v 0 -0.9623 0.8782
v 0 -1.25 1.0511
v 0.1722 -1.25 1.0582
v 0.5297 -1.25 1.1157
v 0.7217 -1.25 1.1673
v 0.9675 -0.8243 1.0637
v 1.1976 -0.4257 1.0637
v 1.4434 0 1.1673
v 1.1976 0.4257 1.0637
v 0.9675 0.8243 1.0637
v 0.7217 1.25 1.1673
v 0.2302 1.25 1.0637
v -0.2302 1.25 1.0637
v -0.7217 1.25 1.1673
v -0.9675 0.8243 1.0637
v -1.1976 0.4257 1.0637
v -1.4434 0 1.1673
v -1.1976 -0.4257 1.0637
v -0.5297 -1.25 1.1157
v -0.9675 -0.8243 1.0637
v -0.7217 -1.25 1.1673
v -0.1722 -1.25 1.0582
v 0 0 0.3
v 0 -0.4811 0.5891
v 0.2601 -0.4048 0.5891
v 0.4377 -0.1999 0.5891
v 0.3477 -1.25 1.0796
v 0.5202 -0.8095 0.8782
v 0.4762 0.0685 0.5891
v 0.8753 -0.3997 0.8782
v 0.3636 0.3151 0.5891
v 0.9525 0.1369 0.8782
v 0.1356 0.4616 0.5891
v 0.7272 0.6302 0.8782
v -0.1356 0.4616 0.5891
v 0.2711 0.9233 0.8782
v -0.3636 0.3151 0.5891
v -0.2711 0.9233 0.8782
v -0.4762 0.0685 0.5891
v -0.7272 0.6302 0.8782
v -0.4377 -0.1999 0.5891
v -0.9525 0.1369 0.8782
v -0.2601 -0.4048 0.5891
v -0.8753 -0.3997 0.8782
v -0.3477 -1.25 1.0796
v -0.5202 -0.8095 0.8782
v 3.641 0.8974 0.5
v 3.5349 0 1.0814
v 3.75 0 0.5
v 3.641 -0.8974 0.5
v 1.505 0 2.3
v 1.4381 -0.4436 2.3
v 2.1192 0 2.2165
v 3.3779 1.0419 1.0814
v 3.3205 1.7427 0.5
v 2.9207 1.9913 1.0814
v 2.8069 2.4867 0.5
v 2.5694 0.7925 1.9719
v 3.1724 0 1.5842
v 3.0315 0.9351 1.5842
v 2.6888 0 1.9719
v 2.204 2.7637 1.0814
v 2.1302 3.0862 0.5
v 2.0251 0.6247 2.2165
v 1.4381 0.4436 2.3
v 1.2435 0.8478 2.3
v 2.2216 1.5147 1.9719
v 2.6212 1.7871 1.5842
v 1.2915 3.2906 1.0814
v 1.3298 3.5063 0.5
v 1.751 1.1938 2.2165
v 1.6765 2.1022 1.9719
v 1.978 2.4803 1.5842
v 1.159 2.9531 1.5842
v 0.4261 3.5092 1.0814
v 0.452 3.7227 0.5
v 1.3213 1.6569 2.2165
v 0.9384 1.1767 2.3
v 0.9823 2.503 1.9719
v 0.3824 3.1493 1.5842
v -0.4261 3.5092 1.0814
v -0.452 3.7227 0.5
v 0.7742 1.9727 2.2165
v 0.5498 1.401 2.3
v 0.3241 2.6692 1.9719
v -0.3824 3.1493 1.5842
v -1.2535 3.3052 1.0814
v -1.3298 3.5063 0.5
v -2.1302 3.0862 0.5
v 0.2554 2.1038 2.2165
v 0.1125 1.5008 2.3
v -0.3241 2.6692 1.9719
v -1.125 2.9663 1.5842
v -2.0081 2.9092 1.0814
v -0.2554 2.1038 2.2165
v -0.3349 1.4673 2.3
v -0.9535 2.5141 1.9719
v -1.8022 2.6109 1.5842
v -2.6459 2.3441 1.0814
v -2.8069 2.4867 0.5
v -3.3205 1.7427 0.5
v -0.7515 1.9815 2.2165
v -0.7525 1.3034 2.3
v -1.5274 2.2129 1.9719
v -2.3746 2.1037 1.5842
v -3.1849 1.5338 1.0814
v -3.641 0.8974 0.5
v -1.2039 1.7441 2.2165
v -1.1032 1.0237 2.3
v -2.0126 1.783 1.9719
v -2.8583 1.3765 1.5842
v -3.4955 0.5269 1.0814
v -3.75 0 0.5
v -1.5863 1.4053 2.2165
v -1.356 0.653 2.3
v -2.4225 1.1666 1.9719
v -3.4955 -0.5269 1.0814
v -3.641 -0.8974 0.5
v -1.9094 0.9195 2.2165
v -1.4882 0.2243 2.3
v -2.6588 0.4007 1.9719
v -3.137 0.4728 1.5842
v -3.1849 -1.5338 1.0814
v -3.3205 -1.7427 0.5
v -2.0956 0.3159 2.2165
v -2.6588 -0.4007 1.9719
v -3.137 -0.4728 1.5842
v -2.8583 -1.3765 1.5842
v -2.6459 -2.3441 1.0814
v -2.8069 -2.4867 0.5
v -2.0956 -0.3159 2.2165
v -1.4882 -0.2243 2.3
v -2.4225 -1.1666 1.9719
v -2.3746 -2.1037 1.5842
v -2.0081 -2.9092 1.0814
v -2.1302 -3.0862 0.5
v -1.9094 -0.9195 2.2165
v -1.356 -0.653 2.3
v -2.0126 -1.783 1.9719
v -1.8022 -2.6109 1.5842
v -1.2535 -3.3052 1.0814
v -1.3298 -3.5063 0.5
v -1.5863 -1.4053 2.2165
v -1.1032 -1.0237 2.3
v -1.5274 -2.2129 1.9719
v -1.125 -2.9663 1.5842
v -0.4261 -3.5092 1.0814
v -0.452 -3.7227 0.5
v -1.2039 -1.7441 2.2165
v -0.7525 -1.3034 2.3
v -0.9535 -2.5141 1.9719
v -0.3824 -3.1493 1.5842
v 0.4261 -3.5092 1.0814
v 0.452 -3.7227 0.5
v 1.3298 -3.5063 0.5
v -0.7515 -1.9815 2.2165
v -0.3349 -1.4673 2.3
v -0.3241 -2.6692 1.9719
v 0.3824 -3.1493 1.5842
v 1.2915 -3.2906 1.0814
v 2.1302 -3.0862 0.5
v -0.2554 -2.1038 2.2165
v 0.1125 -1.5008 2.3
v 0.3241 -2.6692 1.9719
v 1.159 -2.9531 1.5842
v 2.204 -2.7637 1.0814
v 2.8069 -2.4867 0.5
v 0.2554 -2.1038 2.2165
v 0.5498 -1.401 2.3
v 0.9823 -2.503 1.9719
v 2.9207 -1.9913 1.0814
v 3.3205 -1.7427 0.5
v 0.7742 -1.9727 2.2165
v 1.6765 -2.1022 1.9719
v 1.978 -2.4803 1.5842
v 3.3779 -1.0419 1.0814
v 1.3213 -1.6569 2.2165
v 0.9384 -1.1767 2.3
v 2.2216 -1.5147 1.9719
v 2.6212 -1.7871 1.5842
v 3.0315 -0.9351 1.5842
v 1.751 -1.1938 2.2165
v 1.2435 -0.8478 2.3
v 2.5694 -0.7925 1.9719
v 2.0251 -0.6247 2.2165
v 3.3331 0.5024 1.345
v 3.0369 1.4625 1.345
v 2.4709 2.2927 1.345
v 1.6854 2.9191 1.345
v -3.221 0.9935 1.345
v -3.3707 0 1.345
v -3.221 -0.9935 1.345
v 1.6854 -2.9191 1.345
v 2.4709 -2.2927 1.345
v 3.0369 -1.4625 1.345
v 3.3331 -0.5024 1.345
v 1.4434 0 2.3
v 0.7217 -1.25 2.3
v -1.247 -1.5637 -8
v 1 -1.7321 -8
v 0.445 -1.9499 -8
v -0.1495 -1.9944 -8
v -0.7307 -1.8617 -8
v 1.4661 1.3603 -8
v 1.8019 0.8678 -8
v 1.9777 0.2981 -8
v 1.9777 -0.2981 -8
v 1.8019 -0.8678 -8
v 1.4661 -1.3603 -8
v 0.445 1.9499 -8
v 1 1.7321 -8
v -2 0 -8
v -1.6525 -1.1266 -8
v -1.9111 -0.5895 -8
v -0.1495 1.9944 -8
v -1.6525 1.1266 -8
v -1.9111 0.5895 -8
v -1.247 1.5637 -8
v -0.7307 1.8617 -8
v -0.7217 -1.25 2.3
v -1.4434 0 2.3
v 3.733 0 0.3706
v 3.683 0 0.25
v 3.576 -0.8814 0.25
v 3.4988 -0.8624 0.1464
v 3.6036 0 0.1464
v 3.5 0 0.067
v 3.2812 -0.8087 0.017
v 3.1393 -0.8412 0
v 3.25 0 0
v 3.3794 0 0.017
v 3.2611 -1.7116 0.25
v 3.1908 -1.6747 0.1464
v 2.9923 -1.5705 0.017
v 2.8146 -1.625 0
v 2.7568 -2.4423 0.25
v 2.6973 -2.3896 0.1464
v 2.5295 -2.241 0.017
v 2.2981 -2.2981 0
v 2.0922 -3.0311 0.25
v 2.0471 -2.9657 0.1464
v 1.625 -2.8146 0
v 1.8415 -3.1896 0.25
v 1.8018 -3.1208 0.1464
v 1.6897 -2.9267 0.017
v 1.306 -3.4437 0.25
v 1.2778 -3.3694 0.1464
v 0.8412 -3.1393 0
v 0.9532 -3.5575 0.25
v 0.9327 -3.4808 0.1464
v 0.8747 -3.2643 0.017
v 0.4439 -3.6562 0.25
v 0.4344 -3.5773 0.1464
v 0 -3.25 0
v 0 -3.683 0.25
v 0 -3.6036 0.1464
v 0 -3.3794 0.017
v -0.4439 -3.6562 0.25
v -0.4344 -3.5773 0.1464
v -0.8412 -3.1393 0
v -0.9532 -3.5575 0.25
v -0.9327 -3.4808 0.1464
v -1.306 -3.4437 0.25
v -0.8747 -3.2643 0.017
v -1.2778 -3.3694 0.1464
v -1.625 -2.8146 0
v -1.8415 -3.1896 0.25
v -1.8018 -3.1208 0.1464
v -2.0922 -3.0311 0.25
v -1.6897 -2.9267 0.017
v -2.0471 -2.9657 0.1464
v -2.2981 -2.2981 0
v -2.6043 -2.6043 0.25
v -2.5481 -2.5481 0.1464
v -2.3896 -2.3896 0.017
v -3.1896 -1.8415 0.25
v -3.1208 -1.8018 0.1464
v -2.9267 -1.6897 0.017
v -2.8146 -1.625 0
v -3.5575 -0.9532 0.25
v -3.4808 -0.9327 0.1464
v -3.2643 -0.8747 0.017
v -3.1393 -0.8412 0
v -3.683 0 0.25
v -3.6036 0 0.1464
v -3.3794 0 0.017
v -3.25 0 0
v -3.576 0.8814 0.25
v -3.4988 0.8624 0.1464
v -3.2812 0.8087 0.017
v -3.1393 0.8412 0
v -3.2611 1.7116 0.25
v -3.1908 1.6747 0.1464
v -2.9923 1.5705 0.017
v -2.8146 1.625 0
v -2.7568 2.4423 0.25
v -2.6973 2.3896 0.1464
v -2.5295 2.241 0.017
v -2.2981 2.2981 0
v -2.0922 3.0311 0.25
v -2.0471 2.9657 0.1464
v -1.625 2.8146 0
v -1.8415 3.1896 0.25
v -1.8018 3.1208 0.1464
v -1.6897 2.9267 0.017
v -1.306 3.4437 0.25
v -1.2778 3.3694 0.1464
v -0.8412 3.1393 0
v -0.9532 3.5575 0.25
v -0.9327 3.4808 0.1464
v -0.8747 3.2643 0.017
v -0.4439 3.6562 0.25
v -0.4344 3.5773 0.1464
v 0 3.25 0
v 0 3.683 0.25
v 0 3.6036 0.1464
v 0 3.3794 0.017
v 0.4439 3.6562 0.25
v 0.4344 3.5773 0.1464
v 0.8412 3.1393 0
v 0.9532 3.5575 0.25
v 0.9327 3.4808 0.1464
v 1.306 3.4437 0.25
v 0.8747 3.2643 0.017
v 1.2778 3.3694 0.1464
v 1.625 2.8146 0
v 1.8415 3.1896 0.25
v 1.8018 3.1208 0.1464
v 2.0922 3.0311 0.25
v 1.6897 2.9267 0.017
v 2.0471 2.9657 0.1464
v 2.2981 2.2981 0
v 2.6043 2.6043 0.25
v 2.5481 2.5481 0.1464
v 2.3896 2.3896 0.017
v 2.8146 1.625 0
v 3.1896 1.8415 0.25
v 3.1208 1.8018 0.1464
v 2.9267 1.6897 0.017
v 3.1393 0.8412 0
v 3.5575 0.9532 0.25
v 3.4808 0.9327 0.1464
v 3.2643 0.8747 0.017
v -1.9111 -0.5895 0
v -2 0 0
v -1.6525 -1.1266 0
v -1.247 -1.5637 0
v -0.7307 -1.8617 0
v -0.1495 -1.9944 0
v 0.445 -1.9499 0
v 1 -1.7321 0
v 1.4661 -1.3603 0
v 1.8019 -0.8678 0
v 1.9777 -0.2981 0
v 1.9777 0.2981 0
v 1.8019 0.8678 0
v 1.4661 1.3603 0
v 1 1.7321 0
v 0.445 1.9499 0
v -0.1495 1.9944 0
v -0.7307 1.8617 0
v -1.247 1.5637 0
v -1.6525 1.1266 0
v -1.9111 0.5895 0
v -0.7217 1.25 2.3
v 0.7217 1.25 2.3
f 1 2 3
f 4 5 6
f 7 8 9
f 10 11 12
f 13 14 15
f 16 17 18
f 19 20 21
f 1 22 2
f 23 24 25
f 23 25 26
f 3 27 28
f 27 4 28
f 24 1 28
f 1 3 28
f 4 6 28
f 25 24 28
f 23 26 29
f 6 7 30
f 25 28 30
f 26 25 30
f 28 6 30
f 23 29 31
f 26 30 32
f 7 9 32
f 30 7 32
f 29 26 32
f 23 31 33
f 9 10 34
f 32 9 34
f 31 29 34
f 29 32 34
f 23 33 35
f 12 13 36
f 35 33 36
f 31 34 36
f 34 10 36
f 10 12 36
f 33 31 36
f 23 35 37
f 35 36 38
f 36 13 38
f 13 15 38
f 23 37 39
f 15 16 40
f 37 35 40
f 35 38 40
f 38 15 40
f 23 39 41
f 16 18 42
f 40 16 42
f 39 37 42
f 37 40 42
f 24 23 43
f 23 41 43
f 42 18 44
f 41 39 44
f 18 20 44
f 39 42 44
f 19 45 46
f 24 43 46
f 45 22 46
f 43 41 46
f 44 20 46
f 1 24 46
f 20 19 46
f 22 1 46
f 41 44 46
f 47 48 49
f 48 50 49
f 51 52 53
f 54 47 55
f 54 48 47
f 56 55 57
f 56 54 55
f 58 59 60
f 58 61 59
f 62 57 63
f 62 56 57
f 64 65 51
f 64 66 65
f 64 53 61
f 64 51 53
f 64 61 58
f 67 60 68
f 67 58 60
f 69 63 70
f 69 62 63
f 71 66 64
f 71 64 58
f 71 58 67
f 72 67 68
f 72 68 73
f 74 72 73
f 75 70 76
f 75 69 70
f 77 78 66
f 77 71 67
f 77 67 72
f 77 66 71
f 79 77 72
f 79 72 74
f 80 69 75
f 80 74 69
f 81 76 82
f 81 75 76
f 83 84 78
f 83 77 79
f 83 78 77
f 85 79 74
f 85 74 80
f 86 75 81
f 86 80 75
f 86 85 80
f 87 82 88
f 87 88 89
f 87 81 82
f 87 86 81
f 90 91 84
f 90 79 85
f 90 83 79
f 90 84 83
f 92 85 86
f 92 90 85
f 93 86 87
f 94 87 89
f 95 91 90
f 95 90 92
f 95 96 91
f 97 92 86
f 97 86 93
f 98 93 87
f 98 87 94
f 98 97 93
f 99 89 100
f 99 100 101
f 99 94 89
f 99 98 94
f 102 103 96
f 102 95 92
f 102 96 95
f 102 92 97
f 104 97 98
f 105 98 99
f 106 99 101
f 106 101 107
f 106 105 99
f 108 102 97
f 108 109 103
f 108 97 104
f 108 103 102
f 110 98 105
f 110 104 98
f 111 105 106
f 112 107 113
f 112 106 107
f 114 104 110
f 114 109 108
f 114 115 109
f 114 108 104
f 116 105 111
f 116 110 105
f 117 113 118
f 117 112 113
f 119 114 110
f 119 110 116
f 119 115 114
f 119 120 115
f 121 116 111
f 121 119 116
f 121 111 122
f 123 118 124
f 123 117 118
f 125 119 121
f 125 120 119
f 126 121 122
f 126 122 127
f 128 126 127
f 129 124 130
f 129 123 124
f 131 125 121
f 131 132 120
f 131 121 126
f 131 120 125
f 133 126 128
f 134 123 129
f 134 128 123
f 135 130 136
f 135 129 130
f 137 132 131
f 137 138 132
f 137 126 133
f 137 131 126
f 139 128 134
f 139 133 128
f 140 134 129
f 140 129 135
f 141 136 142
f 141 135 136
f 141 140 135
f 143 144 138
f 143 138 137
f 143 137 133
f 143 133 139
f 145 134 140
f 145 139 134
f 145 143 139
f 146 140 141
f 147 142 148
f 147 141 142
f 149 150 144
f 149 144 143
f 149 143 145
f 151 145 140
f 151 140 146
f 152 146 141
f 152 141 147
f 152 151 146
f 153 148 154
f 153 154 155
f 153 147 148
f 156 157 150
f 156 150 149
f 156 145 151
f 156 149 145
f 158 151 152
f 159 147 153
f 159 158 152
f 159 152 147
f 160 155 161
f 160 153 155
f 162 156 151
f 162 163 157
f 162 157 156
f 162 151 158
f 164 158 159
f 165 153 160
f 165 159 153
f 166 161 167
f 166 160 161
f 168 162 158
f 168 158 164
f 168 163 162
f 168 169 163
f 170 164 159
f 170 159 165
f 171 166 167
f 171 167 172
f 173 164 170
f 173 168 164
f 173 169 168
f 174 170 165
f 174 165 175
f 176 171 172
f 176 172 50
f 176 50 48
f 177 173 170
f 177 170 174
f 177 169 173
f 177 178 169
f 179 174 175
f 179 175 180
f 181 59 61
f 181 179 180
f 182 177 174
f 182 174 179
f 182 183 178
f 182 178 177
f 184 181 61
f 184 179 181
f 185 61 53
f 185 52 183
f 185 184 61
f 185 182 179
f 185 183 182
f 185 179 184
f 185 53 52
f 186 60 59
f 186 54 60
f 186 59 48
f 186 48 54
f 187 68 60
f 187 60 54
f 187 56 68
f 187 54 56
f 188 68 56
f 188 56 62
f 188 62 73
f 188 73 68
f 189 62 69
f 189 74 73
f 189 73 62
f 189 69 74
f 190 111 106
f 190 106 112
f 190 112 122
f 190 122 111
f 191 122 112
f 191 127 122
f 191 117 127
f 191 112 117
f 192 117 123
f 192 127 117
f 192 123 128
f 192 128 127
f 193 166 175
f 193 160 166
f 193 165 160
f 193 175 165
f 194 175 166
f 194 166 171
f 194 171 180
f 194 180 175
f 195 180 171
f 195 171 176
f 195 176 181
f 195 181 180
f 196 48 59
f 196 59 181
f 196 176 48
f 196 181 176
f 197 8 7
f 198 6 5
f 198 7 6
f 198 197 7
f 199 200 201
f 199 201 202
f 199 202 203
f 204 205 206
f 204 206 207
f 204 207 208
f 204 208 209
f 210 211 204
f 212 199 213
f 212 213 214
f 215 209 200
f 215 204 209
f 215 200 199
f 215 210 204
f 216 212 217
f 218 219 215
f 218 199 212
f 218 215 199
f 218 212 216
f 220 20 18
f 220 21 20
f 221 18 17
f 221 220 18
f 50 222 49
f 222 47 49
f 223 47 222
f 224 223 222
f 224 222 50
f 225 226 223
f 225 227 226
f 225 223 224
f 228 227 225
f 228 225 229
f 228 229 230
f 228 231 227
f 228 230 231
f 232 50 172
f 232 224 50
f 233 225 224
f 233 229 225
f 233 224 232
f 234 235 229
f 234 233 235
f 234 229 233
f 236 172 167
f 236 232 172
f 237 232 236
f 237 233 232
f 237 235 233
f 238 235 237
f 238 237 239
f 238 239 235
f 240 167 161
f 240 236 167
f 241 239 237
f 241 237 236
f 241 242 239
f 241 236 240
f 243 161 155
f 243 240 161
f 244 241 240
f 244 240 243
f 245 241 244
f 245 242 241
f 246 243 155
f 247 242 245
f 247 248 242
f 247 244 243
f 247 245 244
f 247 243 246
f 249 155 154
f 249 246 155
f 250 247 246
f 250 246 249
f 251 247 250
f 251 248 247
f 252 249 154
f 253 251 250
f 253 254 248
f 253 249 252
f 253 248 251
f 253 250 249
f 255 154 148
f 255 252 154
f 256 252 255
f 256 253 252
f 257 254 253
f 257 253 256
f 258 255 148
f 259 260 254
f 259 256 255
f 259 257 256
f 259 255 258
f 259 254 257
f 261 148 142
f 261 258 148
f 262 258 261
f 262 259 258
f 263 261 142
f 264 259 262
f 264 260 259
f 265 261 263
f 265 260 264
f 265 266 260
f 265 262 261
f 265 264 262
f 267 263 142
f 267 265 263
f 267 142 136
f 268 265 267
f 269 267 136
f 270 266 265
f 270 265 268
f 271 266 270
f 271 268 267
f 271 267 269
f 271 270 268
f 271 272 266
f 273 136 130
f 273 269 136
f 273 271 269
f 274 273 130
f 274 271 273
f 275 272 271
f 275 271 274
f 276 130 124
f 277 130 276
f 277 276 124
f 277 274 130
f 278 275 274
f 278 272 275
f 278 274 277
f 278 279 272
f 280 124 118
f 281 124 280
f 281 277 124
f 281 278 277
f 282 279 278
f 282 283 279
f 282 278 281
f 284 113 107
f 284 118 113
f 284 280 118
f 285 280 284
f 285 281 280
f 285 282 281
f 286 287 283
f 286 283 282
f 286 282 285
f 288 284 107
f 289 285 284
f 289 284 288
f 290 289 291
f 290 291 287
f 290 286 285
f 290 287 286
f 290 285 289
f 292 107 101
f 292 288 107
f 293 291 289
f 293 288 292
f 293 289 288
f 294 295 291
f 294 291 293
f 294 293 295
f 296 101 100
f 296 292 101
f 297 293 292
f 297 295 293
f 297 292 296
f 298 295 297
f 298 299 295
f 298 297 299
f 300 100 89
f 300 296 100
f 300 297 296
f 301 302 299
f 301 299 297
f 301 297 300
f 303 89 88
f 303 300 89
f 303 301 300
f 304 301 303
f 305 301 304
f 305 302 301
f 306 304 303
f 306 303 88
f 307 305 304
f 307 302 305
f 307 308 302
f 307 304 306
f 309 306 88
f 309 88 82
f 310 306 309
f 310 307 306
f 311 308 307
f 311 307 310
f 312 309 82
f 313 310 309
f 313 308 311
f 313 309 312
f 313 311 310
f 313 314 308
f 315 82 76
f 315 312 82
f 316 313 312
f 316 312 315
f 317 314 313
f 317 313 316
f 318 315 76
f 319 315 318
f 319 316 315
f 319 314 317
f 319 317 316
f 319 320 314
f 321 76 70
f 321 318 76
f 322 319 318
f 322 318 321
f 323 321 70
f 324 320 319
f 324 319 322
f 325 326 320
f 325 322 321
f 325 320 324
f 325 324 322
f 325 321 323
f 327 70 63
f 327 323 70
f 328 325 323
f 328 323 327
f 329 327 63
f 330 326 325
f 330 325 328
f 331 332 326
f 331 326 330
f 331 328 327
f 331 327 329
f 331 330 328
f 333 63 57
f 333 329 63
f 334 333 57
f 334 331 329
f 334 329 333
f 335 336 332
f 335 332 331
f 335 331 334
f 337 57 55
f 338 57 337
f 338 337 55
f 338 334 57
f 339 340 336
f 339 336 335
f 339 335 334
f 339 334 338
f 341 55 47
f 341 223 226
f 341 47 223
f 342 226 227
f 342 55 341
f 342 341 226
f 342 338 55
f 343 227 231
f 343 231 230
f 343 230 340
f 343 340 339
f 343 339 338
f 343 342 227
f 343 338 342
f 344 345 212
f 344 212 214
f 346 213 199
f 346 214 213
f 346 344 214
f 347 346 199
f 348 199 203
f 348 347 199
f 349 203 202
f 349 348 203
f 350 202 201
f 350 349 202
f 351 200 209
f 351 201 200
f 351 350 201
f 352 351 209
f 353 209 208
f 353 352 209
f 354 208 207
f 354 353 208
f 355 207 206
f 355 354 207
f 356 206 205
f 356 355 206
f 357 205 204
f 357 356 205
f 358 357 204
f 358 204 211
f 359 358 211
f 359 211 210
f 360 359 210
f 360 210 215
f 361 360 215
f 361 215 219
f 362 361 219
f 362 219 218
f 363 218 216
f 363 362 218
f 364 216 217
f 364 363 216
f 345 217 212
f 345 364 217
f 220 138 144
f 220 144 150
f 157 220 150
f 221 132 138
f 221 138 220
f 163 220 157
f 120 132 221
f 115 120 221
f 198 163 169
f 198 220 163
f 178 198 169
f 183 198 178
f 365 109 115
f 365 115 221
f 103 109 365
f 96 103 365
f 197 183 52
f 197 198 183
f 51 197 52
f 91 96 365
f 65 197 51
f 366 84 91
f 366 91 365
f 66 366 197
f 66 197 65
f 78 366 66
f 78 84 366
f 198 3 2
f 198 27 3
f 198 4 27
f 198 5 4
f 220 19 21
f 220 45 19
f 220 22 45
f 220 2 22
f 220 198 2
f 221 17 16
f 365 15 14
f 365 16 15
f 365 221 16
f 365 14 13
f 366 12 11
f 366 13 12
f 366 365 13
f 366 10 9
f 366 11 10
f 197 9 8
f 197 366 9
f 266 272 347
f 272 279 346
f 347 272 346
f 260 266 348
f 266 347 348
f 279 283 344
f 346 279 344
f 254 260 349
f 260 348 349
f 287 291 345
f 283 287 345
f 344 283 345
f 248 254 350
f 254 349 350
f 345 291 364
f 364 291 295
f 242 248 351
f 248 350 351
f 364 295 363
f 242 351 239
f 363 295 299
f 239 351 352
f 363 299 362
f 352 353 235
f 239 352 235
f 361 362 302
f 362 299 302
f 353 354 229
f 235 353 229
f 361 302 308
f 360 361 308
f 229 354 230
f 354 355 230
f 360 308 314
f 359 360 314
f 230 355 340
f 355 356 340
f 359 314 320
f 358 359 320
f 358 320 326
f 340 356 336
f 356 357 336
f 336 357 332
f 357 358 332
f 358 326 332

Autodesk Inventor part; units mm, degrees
ref_plane "YZ Plane" through (0, 0, 0) normal (1, 0, 0) x (0, 1, 0)
ref_plane "XZ Plane" through (0, 0, 0) normal (0, 1, 0) x (-1, 0, 0)
ref_plane "XY Plane" through (0, 0, 0) normal (0, 0, 1) x (1, 0, 0)
sketch "Sketch1" plane through (0, 0, 0) normal (0, 0, 1) x (1, 0, 0)
  circle A0 centre (0, 0) radius 3.75
  dimension "d0" = 7.5
extrude "Extrusion1" add sketch "Sketch1" along normal blind 2.3
fillet "Fillet3" radius 0.5 1 edges at (-3.75, 0, 0)
fillet "Fillet4" radius 2.3 1 edges at (-3.75, 0, 2.3)
sketch "草圖6" plane through (0, 0, 2.3) normal (0, 0, 1) x (1, 0, 0)
  circle A0 centre (0, 0) radius 1.505 projected
  line L0 (0.7217, 1.25) -> (1.4434, 0)
  line L1 (1.4434, 0) -> (0.7217, -1.25)
  line L2 (0.7217, -1.25) -> (-0.7217, -1.25)
  line L3 (-0.7217, -1.25) -> (-1.4434, 0)
  line L4 (-1.4434, 0) -> (-0.7217, 1.25)
  line L5 (-0.7217, 1.25) -> (0.7217, 1.25)
  dimension "d27" = 2.5
extrude "擠出4" cut sketch "草圖6" against normal blind 2 contours L0 L1 L2 L3 L4 L5
sketch "草圖7" plane through (0, 0, 0) normal (1, 0, 0) x (0, 1, 0)
  line L0 (0, 0.3) -> (-2, 1.5017)
  line L1 (-2, 1.5017) -> (-2, 0.3)
  line L2 (0, 0.3) -> (-2, 0.3)
  line L3 (0, 0) -> (0, 2.4201)
  dimension "d30" = 0.3
  dimension "d31" = 31
  dimension "d34" = 2
revolve "迴轉3" add sketch "草圖7" angle 360 about axis through (0, 0, 0) along (0, 0, 1)
sketch "草圖8" plane through (0, 0, 0) normal (0, 0, -1) x (-1, 0, 0)
  circle A0 centre (0, 0) radius 3.25 projected
  circle A1 centre (0, 0) radius 2
  dimension "d35" = 4
extrude "擠出5" add sketch "草圖8" along normal blind 8 contours A1
thread "螺紋2" size "M4x0.7" class "6g" standard "ANSI Metric M Profile" full length
properties part number "screw_M3_10_hex"
